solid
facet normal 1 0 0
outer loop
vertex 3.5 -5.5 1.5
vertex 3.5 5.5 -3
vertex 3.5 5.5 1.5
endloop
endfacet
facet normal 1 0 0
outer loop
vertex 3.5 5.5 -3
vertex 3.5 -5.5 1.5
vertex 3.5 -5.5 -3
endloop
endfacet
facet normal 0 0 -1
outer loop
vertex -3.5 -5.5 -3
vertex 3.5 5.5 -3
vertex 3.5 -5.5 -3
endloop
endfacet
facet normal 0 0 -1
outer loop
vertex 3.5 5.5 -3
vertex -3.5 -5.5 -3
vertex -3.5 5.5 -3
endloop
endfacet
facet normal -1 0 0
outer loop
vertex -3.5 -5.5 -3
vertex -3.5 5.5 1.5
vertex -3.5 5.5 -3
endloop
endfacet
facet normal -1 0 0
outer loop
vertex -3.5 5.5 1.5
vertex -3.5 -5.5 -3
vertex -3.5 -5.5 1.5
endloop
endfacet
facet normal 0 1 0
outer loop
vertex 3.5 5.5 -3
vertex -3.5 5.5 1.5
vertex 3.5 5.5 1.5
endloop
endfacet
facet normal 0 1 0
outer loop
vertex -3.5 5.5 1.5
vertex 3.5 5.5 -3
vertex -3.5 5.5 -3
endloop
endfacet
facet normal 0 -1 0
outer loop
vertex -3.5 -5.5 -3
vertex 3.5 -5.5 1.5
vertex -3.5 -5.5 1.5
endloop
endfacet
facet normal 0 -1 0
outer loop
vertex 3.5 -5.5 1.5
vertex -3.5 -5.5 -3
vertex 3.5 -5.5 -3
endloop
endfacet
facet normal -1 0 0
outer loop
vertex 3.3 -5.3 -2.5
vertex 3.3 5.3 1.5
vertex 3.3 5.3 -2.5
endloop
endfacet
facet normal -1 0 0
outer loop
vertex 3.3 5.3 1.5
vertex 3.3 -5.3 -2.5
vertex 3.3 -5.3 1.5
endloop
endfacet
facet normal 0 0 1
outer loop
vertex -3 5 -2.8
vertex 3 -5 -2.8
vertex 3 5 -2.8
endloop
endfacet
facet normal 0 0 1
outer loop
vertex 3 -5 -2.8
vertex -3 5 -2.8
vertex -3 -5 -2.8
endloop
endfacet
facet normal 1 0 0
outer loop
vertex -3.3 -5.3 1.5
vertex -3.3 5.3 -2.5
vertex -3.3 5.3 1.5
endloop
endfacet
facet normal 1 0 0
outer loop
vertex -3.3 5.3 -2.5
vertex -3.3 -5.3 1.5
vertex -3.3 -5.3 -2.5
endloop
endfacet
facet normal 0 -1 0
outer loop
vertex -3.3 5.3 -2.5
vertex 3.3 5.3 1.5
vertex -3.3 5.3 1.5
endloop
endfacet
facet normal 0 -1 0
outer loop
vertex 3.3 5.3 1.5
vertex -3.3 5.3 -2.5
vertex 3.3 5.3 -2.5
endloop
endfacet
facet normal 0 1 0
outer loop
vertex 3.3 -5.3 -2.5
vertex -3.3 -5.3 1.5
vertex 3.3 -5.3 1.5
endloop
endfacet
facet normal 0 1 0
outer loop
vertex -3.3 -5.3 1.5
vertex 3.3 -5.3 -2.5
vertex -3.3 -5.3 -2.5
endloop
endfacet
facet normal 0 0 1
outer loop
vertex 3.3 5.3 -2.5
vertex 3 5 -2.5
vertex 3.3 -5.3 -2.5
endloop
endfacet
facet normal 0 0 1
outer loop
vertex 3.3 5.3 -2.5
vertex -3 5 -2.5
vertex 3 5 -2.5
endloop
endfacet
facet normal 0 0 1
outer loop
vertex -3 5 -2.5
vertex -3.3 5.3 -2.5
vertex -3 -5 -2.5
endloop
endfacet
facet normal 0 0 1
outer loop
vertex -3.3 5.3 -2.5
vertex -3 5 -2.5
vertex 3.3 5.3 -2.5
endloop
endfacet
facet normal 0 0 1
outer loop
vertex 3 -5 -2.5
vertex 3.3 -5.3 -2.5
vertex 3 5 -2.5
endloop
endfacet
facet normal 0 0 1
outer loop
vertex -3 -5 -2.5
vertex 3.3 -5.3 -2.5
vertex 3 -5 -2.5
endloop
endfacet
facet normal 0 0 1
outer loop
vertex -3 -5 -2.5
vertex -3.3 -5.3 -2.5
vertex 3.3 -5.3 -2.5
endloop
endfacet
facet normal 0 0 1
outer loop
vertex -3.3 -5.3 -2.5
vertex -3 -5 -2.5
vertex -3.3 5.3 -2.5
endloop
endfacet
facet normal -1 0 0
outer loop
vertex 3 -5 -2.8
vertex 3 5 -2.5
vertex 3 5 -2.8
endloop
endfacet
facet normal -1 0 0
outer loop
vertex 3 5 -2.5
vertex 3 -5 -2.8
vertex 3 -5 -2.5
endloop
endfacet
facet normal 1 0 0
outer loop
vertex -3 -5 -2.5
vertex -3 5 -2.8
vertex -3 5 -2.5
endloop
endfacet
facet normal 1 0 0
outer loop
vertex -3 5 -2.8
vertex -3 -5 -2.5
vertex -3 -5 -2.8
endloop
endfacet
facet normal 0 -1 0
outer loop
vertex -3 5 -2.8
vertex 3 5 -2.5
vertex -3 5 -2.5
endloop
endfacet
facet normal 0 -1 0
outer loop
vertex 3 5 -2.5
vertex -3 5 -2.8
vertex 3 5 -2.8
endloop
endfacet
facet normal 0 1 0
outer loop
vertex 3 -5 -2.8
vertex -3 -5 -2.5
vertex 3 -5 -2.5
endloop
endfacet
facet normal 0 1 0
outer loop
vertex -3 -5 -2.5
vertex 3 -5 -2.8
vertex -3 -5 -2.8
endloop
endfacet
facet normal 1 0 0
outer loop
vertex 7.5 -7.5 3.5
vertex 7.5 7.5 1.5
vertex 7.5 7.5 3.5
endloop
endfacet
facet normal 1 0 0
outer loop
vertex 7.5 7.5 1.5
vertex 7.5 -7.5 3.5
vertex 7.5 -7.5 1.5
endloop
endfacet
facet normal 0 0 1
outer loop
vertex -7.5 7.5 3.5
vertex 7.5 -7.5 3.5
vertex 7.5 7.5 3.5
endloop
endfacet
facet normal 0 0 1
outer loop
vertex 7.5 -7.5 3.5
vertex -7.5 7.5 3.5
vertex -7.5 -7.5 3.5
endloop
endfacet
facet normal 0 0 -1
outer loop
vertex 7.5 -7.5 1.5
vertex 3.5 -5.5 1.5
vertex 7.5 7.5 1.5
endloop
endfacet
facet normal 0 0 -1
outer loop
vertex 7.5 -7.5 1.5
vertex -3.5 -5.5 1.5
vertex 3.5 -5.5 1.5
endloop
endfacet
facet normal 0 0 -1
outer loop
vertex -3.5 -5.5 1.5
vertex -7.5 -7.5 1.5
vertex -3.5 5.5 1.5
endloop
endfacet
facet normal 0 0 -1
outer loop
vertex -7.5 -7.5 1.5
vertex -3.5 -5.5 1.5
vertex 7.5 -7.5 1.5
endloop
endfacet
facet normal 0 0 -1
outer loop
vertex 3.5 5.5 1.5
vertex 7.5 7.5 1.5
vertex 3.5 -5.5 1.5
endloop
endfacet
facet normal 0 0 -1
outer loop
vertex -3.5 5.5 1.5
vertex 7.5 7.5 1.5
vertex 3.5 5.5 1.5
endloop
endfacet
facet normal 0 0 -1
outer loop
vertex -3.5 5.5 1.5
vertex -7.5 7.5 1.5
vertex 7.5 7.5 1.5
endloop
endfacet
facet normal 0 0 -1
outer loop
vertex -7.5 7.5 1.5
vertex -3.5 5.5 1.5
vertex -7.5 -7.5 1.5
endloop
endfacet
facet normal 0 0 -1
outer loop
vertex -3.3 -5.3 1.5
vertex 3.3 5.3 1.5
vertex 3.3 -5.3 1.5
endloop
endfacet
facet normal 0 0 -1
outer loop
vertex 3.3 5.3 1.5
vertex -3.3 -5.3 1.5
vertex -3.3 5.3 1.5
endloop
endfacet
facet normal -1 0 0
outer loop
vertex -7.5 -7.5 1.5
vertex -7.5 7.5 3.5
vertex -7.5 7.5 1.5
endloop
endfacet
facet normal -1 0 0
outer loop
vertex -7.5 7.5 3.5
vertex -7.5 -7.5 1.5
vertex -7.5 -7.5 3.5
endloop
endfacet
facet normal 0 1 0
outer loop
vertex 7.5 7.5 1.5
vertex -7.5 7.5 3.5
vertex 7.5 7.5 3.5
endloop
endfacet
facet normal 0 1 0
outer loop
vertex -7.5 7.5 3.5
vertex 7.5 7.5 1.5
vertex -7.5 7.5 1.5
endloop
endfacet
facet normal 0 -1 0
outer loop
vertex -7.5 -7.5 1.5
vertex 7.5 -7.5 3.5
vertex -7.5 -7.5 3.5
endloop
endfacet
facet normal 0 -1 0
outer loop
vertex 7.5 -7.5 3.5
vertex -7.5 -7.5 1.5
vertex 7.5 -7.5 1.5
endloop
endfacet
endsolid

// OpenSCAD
n=0.2; //épaisseur parois
visu="bas";
union(){
    difference(){
        cube([7,11,6],center=true);
        cube([7-2*n,11-2*n,6-2*n],center=true);
    }
    translate([0,0,-2.75])
    difference(){
        a=1;
        cube([7,11,0.5],center=true);
        cube([7-a,11-a,1],center=true);
    }
}
translate([0,0,2.5])
cube([15,15,2],center=true);
